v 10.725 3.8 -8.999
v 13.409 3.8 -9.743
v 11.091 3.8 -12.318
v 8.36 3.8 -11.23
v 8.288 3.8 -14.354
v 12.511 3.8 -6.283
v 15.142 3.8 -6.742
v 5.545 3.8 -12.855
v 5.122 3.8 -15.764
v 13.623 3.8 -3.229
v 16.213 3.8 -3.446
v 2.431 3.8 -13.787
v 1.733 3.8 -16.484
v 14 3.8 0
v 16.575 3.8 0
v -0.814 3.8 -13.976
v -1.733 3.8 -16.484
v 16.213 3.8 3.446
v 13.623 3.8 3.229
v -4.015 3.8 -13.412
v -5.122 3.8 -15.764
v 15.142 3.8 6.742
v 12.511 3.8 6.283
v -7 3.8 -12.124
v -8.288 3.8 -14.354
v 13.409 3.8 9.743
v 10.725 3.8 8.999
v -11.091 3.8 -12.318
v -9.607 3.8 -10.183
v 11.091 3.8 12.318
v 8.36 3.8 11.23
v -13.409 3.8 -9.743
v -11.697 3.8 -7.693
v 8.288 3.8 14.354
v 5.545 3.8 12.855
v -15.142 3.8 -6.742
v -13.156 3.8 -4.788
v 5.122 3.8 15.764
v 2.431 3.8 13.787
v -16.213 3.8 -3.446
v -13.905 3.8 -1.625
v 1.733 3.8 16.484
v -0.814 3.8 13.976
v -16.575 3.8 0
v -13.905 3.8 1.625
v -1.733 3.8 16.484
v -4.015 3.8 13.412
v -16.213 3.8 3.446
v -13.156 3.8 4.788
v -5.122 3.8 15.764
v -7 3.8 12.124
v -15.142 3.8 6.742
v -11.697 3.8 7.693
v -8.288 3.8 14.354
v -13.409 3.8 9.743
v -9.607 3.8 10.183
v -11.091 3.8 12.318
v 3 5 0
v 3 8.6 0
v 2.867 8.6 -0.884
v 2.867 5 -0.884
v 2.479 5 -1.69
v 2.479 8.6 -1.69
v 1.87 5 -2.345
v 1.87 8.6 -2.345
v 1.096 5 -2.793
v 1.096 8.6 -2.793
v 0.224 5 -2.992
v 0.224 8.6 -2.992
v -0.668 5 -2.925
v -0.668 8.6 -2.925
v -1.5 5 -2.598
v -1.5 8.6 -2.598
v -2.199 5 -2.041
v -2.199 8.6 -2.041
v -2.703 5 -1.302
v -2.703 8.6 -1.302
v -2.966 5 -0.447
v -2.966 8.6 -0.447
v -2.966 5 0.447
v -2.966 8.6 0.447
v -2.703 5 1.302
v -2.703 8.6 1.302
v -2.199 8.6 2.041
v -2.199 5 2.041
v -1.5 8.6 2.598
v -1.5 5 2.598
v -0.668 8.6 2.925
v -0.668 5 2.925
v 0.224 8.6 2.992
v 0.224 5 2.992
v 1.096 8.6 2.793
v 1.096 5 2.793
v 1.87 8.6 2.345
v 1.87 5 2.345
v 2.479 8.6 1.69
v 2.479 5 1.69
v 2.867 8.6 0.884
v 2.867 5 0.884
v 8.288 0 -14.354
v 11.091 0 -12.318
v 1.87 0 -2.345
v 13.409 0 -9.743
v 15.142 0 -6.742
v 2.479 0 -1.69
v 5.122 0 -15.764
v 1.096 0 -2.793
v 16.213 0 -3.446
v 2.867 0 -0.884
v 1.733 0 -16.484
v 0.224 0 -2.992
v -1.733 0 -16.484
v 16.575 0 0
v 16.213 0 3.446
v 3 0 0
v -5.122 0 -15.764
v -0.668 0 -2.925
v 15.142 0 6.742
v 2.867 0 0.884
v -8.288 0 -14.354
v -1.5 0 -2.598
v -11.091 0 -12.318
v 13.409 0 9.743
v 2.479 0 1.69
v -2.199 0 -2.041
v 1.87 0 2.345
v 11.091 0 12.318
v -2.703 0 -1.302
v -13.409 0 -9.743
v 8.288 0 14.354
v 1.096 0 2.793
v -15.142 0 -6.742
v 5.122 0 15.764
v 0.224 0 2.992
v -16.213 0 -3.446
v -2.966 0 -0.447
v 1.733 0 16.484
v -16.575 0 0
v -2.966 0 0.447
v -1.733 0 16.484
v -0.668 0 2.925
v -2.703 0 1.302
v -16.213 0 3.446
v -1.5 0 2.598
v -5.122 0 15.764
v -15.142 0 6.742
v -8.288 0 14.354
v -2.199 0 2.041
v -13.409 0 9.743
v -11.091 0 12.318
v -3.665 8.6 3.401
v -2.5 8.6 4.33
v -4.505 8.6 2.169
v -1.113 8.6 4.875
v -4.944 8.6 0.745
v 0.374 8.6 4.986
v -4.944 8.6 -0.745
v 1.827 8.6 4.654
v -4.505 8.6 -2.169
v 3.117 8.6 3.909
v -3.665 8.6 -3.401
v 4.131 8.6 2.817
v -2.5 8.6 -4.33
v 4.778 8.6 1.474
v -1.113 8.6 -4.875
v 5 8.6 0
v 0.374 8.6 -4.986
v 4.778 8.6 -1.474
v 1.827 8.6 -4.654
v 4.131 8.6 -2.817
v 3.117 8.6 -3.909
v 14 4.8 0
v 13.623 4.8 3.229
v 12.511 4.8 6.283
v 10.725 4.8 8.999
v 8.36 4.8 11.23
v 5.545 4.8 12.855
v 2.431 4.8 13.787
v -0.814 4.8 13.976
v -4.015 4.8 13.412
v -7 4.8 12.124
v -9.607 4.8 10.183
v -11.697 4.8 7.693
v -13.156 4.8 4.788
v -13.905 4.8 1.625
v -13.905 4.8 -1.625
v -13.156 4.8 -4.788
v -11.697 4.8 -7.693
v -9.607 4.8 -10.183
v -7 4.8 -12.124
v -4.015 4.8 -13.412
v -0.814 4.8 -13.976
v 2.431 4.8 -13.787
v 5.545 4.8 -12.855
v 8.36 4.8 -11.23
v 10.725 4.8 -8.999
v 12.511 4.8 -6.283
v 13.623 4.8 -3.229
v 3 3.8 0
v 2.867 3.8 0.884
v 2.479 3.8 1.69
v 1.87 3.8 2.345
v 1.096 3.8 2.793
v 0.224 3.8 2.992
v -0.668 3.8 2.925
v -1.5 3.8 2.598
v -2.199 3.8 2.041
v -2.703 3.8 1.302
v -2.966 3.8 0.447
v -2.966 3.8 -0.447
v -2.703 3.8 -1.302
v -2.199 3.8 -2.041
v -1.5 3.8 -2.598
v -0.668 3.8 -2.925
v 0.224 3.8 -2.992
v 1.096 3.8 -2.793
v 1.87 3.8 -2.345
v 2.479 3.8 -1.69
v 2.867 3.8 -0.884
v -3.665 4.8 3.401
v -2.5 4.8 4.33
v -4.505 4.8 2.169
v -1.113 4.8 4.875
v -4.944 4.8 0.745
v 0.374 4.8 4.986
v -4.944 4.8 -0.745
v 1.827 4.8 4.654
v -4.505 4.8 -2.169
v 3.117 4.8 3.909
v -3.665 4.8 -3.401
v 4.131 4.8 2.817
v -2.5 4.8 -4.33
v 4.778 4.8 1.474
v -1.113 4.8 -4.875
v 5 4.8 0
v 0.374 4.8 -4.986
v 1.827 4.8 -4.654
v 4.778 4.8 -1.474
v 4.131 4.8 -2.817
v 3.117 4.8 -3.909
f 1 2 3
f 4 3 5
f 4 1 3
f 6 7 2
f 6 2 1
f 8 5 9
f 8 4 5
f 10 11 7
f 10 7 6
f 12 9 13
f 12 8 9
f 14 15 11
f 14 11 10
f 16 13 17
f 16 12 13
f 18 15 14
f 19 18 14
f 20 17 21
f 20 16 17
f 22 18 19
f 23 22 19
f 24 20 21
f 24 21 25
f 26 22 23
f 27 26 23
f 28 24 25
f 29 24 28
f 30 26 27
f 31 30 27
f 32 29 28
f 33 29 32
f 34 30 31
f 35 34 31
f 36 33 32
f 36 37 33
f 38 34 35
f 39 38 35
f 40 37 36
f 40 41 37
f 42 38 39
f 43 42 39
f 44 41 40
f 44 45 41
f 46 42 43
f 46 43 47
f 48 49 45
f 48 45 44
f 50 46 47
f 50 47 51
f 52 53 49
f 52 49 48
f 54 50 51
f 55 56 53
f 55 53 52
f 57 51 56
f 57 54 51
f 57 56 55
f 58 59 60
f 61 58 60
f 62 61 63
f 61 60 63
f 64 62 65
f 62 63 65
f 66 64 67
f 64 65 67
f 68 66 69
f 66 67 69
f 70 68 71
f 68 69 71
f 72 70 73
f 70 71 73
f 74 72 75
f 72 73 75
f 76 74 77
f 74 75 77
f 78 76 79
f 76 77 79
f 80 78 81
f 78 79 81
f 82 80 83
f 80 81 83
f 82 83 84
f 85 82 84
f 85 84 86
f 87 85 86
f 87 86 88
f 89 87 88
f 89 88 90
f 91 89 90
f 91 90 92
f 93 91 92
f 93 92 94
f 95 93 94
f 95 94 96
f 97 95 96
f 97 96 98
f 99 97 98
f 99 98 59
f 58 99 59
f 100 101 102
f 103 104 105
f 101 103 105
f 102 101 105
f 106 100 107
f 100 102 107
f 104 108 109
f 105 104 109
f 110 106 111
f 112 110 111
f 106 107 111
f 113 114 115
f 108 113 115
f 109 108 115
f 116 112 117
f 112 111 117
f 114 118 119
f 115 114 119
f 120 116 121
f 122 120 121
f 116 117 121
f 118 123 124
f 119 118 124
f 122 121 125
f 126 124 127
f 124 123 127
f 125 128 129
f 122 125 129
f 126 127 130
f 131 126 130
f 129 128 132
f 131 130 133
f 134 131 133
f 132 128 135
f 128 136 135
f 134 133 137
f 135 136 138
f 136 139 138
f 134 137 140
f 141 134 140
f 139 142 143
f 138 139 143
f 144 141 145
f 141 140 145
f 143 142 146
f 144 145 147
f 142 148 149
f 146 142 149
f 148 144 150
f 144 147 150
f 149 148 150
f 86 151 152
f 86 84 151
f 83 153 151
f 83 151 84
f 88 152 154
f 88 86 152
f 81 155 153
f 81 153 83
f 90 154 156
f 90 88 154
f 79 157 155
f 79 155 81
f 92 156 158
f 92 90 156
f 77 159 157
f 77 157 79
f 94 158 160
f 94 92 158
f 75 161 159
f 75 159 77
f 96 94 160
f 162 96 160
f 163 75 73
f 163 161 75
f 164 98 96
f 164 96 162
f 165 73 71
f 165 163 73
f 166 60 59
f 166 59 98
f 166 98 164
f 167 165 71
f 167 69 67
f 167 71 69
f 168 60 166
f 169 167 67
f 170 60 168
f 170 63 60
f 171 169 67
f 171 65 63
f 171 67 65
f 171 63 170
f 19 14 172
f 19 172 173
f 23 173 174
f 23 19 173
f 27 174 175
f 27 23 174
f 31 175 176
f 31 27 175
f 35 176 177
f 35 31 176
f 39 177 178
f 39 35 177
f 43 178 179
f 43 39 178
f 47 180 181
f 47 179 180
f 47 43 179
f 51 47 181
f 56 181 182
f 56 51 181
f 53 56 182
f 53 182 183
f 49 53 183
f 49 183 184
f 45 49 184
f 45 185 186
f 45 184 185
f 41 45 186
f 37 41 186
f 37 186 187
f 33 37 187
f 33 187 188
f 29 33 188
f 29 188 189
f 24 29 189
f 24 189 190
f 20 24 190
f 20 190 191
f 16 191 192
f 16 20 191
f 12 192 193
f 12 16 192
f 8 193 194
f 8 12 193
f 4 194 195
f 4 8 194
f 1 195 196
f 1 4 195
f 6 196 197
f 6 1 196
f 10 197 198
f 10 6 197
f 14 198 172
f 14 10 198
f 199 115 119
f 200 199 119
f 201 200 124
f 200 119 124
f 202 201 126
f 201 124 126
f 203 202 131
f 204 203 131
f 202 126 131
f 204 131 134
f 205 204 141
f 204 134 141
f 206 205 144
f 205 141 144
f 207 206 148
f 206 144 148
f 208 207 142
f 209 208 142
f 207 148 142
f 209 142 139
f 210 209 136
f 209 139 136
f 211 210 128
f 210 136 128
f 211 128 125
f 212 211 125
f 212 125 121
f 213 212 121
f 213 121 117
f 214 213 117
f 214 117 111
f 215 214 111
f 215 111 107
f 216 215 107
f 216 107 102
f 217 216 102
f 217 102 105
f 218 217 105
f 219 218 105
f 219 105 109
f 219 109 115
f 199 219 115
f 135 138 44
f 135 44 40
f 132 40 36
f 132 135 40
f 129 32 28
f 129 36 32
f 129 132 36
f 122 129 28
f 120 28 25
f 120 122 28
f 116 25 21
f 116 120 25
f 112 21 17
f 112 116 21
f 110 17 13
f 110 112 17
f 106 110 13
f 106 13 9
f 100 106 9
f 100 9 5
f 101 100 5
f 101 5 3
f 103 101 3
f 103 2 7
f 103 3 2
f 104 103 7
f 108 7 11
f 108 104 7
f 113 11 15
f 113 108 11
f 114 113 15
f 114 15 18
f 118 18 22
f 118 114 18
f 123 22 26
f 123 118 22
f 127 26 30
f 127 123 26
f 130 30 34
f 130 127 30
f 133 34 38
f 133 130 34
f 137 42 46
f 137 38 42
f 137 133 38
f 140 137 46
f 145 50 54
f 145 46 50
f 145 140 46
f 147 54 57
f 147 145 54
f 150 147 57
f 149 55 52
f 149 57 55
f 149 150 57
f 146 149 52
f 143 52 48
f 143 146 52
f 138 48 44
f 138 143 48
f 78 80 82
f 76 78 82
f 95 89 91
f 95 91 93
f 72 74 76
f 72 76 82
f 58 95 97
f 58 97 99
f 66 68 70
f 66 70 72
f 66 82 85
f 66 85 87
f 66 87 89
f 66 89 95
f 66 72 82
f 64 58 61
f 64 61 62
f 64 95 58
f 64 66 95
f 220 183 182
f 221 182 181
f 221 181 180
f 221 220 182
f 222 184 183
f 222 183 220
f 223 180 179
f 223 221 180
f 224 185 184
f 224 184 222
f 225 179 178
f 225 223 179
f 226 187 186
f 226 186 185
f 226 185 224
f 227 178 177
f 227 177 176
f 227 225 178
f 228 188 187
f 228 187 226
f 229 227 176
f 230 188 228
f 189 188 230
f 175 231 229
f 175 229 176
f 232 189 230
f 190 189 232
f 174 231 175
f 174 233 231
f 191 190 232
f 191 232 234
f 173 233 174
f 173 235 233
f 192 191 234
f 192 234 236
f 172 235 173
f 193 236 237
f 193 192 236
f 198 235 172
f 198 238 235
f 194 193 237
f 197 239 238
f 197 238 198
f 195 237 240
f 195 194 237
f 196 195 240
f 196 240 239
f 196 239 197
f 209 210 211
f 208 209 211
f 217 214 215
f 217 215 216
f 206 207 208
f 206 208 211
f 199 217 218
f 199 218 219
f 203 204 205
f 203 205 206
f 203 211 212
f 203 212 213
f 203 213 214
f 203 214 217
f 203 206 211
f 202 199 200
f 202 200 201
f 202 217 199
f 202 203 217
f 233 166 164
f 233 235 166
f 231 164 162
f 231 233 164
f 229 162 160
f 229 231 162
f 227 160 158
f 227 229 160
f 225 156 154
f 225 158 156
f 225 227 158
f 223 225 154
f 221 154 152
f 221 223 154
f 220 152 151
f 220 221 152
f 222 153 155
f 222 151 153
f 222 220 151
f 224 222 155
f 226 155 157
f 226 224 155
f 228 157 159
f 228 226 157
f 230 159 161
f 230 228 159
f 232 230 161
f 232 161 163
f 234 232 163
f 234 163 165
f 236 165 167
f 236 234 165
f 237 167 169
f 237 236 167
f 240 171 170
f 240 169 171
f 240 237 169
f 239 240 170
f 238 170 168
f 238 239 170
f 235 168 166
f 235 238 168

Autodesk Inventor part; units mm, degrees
ref_plane "YZ Plane" through (0, 0, 0) normal (1, 0, 0) x (0, 1, 0)
ref_plane "XZ Plane" through (0, 0, 0) normal (0, 1, 0) x (-1, 0, 0)
ref_plane "XY Plane" through (0, 0, 0) normal (0, 0, 1) x (1, 0, 0)
sketch "Sketch1" plane through (0, 0, 0) normal (0, 1, 0) x (-1, 0, 0)
  circle A0 centre (0, 0) radius 16.575
  dimension "d0" = 33.15
extrude "Extrusion1" add sketch "Sketch1" along normal blind 3.8
sketch "Sketch2" plane through (0, 3.8, 0) normal (0, 1, 0) x (1, 0, 0)
  circle A0 centre (0, 0) radius 16.575 projected
  circle A1 centre (0, 0) radius 14
  dimension "d3" = 28
extrude "Extrusion2" add sketch "Sketch2" along normal blind 1 contours A1
sketch "Sketch3" plane through (0, 4.8, 0) normal (0, 1, 0) x (1, 0, 0)
  circle A0 centre (0, 0) radius 14 projected
  circle A1 centre (0, 0) radius 5
  dimension "d6" = 10
extrude "Extrusion3" add sketch "Sketch3" along normal blind 3.8 contours A1
sketch "Sketch4" plane through (0, 8.6, 0) normal (0, 1, 0) x (1, 0, 0)
  circle A0 centre (0, 0) radius 5 projected
  circle A1 centre (0, 0) radius 1.8
  dimension "d9" = 3.6
extrude "Extrusion4" cut sketch "Sketch4" against normal blind 3.6 contours A1
sketch "Sketch5" plane through (0, 8.6, 0) normal (0, 1, 0) x (1, 0, 0)
  circle A0 centre (0, 0) radius 1.8 projected
  circle A1 centre (0, 0) radius 5 projected
  circle A2 centre (0, 0) radius 3
  dimension "d12" = 6
extrude "Extrusion5" cut sketch "Sketch5" against normal blind 3.6 contours A2
sketch "Sketch6" plane through (0, 0, 0) normal (0, -1, 0) x (1, 0, 0)
  circle A0 centre (0, 0) radius 16.575 projected
  circle A1 centre (0, 0) radius 3
  dimension "d15" = 6
extrude "Extrusion6" cut sketch "Sketch6" against normal blind 3.8 contours A1
properties part number "kolecko_servo(3)"
